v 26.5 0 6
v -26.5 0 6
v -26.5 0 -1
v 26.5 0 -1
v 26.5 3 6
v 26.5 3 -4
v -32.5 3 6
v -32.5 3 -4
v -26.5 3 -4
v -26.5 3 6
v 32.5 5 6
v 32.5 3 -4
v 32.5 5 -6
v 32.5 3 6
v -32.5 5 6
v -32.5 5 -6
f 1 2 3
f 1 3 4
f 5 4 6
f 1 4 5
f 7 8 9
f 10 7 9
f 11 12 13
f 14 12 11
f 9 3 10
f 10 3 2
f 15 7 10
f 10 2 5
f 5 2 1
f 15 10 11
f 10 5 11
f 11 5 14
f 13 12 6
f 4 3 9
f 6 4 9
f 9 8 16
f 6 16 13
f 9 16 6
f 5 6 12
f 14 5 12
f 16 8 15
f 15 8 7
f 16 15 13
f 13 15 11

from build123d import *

# Parameters (mm, degrees)
F0_W     = 65
F0_H     = 12
F1_DEPTH = 5
F3_DEPTH = 65.001
F4_W     = 6
F4_H     = 12
F5_DEPTH = 3


with BuildPart() as f1:
    # F0 (on Front) → F1 (new body)
    with BuildSketch(Plane.XZ):
        Rectangle(F0_W, F0_H)
    extrude(amount=-F1_DEPTH)

    # F2 (on face) → F3 (cut, through all)
    with BuildSketch(Plane(origin=(-32.5, 0, 0), x_dir=(0, -1, 0), z_dir=(-1, 0, 0))):
        Polygon((0, -6), (0, -1), (-5, -6), align=None)
    extrude(amount=-F3_DEPTH, mode=Mode.SUBTRACT)

    # F4 (on face) → F5 (cut)
    with BuildSketch(Plane.XZ):
        with Locations((29.5, 0)):
            Rectangle(F4_W, F4_H)
        with Locations((-29.5, 0)):
            Rectangle(F4_W, F4_H)
    extrude(amount=-F5_DEPTH, mode=Mode.SUBTRACT)


solid = f1.part
